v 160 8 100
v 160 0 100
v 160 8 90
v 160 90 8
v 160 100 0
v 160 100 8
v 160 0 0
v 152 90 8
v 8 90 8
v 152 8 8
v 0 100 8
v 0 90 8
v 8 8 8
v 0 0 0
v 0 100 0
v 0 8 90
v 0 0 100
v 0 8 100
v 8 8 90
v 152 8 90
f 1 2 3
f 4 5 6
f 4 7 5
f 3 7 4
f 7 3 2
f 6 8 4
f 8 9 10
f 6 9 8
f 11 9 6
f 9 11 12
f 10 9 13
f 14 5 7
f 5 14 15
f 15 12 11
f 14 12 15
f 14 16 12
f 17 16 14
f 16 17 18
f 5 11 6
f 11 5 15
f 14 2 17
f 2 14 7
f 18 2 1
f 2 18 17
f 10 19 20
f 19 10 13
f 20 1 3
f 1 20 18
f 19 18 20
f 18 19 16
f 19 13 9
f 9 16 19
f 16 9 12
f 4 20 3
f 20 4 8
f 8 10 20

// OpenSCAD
height=100;
width=160;
thickness=8;

cube([width, height, thickness]);
cube([width,thickness,height]);

translate([thickness,0,0])
rotate([0,-90,0])
linear_extrude(thickness)
polygon( points=[[thickness,thickness],[thickness,90],[90,thickness]]);

translate([width,0,0])
rotate([0,-90,0])
linear_extrude(thickness)
polygon( points=[[thickness,thickness],[thickness,90],[90,thickness]]);
